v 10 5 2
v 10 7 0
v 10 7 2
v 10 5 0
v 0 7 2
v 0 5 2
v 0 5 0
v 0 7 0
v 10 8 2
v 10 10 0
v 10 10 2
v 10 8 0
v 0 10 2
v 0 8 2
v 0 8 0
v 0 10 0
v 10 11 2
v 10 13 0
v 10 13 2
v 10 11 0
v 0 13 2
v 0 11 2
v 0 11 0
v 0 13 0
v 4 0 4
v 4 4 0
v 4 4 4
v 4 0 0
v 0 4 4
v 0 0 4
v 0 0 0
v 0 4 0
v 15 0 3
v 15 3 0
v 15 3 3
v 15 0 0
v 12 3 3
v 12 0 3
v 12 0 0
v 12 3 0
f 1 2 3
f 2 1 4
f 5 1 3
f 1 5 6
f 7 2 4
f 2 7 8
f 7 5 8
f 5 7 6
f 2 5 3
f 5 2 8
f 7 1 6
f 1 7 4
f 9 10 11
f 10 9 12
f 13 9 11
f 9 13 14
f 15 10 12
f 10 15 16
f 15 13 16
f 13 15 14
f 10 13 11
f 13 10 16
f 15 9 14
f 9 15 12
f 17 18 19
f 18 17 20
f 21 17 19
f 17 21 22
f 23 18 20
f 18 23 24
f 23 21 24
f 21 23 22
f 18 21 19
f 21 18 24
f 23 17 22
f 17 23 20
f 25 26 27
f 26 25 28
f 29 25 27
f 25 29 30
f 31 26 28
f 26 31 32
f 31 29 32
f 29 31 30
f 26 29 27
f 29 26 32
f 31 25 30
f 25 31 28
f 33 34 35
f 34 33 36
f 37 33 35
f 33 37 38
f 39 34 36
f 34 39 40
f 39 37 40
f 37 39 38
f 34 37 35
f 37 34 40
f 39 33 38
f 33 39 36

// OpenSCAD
module wrap() { color("green") children(); }
module bar(c) color(c) cube([10, 2, 2]);
wrap() cube(4);
for (i = [0:2]) translate([0, 5 + i * 3, 0]) bar(["red", "blue", "red"][i]);
wrap() translate([12,0,0]) color("yellow") cube(3);
